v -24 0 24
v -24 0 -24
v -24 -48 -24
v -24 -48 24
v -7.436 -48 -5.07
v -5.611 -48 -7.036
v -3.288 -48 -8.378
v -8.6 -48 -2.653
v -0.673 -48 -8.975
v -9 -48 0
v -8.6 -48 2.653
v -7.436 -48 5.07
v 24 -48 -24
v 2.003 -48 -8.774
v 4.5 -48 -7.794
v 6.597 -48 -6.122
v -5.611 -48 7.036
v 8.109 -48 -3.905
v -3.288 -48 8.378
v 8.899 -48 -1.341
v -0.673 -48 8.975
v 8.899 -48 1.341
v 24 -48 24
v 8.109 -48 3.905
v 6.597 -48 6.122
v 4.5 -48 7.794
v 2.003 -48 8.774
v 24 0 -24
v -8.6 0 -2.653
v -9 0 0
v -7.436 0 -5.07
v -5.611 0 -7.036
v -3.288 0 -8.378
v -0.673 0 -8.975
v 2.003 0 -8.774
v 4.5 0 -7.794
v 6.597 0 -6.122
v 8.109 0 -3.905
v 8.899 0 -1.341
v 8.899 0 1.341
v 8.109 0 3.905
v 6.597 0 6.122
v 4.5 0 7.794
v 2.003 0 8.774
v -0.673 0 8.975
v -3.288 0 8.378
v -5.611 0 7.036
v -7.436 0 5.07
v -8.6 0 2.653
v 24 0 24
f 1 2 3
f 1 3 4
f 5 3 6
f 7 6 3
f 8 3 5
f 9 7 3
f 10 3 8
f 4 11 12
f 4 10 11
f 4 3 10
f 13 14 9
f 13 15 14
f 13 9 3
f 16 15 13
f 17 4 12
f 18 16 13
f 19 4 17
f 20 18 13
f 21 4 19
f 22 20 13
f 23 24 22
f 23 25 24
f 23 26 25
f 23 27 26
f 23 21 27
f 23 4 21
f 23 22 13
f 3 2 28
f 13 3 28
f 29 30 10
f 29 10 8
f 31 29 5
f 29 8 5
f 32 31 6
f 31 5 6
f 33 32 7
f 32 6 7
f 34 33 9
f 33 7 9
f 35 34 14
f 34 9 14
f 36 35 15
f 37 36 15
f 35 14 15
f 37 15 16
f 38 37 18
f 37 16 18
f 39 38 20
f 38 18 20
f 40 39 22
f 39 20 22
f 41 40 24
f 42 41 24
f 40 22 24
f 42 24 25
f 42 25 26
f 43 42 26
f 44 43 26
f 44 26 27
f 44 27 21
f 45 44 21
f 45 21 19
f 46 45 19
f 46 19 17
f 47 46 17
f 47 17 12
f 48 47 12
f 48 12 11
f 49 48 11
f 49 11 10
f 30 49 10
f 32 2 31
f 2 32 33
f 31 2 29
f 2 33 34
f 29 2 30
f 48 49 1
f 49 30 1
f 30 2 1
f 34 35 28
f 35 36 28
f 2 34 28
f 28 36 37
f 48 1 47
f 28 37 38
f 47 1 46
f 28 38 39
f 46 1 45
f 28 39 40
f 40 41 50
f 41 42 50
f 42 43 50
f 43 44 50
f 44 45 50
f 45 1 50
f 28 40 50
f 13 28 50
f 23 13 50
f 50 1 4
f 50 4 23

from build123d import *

# Parameters (mm, degrees)
F0_W     = 48
F0_H     = 48
F1_DEPTH = 48
F3_D     = 18


with BuildPart() as f1:
    # F0 (on Front) → F1 (new body)
    with BuildSketch(Plane.XZ):
        Rectangle(F0_W, F0_H)
    extrude(amount=F1_DEPTH)

    # F3 (through all)
    with Locations(Plane(origin=(0, 0, 0), x_dir=(1, 0, 0), z_dir=(0, 1, 0))):
        with Locations((0, 0)):
            Hole(F3_D / 2)


solid = f1.part
